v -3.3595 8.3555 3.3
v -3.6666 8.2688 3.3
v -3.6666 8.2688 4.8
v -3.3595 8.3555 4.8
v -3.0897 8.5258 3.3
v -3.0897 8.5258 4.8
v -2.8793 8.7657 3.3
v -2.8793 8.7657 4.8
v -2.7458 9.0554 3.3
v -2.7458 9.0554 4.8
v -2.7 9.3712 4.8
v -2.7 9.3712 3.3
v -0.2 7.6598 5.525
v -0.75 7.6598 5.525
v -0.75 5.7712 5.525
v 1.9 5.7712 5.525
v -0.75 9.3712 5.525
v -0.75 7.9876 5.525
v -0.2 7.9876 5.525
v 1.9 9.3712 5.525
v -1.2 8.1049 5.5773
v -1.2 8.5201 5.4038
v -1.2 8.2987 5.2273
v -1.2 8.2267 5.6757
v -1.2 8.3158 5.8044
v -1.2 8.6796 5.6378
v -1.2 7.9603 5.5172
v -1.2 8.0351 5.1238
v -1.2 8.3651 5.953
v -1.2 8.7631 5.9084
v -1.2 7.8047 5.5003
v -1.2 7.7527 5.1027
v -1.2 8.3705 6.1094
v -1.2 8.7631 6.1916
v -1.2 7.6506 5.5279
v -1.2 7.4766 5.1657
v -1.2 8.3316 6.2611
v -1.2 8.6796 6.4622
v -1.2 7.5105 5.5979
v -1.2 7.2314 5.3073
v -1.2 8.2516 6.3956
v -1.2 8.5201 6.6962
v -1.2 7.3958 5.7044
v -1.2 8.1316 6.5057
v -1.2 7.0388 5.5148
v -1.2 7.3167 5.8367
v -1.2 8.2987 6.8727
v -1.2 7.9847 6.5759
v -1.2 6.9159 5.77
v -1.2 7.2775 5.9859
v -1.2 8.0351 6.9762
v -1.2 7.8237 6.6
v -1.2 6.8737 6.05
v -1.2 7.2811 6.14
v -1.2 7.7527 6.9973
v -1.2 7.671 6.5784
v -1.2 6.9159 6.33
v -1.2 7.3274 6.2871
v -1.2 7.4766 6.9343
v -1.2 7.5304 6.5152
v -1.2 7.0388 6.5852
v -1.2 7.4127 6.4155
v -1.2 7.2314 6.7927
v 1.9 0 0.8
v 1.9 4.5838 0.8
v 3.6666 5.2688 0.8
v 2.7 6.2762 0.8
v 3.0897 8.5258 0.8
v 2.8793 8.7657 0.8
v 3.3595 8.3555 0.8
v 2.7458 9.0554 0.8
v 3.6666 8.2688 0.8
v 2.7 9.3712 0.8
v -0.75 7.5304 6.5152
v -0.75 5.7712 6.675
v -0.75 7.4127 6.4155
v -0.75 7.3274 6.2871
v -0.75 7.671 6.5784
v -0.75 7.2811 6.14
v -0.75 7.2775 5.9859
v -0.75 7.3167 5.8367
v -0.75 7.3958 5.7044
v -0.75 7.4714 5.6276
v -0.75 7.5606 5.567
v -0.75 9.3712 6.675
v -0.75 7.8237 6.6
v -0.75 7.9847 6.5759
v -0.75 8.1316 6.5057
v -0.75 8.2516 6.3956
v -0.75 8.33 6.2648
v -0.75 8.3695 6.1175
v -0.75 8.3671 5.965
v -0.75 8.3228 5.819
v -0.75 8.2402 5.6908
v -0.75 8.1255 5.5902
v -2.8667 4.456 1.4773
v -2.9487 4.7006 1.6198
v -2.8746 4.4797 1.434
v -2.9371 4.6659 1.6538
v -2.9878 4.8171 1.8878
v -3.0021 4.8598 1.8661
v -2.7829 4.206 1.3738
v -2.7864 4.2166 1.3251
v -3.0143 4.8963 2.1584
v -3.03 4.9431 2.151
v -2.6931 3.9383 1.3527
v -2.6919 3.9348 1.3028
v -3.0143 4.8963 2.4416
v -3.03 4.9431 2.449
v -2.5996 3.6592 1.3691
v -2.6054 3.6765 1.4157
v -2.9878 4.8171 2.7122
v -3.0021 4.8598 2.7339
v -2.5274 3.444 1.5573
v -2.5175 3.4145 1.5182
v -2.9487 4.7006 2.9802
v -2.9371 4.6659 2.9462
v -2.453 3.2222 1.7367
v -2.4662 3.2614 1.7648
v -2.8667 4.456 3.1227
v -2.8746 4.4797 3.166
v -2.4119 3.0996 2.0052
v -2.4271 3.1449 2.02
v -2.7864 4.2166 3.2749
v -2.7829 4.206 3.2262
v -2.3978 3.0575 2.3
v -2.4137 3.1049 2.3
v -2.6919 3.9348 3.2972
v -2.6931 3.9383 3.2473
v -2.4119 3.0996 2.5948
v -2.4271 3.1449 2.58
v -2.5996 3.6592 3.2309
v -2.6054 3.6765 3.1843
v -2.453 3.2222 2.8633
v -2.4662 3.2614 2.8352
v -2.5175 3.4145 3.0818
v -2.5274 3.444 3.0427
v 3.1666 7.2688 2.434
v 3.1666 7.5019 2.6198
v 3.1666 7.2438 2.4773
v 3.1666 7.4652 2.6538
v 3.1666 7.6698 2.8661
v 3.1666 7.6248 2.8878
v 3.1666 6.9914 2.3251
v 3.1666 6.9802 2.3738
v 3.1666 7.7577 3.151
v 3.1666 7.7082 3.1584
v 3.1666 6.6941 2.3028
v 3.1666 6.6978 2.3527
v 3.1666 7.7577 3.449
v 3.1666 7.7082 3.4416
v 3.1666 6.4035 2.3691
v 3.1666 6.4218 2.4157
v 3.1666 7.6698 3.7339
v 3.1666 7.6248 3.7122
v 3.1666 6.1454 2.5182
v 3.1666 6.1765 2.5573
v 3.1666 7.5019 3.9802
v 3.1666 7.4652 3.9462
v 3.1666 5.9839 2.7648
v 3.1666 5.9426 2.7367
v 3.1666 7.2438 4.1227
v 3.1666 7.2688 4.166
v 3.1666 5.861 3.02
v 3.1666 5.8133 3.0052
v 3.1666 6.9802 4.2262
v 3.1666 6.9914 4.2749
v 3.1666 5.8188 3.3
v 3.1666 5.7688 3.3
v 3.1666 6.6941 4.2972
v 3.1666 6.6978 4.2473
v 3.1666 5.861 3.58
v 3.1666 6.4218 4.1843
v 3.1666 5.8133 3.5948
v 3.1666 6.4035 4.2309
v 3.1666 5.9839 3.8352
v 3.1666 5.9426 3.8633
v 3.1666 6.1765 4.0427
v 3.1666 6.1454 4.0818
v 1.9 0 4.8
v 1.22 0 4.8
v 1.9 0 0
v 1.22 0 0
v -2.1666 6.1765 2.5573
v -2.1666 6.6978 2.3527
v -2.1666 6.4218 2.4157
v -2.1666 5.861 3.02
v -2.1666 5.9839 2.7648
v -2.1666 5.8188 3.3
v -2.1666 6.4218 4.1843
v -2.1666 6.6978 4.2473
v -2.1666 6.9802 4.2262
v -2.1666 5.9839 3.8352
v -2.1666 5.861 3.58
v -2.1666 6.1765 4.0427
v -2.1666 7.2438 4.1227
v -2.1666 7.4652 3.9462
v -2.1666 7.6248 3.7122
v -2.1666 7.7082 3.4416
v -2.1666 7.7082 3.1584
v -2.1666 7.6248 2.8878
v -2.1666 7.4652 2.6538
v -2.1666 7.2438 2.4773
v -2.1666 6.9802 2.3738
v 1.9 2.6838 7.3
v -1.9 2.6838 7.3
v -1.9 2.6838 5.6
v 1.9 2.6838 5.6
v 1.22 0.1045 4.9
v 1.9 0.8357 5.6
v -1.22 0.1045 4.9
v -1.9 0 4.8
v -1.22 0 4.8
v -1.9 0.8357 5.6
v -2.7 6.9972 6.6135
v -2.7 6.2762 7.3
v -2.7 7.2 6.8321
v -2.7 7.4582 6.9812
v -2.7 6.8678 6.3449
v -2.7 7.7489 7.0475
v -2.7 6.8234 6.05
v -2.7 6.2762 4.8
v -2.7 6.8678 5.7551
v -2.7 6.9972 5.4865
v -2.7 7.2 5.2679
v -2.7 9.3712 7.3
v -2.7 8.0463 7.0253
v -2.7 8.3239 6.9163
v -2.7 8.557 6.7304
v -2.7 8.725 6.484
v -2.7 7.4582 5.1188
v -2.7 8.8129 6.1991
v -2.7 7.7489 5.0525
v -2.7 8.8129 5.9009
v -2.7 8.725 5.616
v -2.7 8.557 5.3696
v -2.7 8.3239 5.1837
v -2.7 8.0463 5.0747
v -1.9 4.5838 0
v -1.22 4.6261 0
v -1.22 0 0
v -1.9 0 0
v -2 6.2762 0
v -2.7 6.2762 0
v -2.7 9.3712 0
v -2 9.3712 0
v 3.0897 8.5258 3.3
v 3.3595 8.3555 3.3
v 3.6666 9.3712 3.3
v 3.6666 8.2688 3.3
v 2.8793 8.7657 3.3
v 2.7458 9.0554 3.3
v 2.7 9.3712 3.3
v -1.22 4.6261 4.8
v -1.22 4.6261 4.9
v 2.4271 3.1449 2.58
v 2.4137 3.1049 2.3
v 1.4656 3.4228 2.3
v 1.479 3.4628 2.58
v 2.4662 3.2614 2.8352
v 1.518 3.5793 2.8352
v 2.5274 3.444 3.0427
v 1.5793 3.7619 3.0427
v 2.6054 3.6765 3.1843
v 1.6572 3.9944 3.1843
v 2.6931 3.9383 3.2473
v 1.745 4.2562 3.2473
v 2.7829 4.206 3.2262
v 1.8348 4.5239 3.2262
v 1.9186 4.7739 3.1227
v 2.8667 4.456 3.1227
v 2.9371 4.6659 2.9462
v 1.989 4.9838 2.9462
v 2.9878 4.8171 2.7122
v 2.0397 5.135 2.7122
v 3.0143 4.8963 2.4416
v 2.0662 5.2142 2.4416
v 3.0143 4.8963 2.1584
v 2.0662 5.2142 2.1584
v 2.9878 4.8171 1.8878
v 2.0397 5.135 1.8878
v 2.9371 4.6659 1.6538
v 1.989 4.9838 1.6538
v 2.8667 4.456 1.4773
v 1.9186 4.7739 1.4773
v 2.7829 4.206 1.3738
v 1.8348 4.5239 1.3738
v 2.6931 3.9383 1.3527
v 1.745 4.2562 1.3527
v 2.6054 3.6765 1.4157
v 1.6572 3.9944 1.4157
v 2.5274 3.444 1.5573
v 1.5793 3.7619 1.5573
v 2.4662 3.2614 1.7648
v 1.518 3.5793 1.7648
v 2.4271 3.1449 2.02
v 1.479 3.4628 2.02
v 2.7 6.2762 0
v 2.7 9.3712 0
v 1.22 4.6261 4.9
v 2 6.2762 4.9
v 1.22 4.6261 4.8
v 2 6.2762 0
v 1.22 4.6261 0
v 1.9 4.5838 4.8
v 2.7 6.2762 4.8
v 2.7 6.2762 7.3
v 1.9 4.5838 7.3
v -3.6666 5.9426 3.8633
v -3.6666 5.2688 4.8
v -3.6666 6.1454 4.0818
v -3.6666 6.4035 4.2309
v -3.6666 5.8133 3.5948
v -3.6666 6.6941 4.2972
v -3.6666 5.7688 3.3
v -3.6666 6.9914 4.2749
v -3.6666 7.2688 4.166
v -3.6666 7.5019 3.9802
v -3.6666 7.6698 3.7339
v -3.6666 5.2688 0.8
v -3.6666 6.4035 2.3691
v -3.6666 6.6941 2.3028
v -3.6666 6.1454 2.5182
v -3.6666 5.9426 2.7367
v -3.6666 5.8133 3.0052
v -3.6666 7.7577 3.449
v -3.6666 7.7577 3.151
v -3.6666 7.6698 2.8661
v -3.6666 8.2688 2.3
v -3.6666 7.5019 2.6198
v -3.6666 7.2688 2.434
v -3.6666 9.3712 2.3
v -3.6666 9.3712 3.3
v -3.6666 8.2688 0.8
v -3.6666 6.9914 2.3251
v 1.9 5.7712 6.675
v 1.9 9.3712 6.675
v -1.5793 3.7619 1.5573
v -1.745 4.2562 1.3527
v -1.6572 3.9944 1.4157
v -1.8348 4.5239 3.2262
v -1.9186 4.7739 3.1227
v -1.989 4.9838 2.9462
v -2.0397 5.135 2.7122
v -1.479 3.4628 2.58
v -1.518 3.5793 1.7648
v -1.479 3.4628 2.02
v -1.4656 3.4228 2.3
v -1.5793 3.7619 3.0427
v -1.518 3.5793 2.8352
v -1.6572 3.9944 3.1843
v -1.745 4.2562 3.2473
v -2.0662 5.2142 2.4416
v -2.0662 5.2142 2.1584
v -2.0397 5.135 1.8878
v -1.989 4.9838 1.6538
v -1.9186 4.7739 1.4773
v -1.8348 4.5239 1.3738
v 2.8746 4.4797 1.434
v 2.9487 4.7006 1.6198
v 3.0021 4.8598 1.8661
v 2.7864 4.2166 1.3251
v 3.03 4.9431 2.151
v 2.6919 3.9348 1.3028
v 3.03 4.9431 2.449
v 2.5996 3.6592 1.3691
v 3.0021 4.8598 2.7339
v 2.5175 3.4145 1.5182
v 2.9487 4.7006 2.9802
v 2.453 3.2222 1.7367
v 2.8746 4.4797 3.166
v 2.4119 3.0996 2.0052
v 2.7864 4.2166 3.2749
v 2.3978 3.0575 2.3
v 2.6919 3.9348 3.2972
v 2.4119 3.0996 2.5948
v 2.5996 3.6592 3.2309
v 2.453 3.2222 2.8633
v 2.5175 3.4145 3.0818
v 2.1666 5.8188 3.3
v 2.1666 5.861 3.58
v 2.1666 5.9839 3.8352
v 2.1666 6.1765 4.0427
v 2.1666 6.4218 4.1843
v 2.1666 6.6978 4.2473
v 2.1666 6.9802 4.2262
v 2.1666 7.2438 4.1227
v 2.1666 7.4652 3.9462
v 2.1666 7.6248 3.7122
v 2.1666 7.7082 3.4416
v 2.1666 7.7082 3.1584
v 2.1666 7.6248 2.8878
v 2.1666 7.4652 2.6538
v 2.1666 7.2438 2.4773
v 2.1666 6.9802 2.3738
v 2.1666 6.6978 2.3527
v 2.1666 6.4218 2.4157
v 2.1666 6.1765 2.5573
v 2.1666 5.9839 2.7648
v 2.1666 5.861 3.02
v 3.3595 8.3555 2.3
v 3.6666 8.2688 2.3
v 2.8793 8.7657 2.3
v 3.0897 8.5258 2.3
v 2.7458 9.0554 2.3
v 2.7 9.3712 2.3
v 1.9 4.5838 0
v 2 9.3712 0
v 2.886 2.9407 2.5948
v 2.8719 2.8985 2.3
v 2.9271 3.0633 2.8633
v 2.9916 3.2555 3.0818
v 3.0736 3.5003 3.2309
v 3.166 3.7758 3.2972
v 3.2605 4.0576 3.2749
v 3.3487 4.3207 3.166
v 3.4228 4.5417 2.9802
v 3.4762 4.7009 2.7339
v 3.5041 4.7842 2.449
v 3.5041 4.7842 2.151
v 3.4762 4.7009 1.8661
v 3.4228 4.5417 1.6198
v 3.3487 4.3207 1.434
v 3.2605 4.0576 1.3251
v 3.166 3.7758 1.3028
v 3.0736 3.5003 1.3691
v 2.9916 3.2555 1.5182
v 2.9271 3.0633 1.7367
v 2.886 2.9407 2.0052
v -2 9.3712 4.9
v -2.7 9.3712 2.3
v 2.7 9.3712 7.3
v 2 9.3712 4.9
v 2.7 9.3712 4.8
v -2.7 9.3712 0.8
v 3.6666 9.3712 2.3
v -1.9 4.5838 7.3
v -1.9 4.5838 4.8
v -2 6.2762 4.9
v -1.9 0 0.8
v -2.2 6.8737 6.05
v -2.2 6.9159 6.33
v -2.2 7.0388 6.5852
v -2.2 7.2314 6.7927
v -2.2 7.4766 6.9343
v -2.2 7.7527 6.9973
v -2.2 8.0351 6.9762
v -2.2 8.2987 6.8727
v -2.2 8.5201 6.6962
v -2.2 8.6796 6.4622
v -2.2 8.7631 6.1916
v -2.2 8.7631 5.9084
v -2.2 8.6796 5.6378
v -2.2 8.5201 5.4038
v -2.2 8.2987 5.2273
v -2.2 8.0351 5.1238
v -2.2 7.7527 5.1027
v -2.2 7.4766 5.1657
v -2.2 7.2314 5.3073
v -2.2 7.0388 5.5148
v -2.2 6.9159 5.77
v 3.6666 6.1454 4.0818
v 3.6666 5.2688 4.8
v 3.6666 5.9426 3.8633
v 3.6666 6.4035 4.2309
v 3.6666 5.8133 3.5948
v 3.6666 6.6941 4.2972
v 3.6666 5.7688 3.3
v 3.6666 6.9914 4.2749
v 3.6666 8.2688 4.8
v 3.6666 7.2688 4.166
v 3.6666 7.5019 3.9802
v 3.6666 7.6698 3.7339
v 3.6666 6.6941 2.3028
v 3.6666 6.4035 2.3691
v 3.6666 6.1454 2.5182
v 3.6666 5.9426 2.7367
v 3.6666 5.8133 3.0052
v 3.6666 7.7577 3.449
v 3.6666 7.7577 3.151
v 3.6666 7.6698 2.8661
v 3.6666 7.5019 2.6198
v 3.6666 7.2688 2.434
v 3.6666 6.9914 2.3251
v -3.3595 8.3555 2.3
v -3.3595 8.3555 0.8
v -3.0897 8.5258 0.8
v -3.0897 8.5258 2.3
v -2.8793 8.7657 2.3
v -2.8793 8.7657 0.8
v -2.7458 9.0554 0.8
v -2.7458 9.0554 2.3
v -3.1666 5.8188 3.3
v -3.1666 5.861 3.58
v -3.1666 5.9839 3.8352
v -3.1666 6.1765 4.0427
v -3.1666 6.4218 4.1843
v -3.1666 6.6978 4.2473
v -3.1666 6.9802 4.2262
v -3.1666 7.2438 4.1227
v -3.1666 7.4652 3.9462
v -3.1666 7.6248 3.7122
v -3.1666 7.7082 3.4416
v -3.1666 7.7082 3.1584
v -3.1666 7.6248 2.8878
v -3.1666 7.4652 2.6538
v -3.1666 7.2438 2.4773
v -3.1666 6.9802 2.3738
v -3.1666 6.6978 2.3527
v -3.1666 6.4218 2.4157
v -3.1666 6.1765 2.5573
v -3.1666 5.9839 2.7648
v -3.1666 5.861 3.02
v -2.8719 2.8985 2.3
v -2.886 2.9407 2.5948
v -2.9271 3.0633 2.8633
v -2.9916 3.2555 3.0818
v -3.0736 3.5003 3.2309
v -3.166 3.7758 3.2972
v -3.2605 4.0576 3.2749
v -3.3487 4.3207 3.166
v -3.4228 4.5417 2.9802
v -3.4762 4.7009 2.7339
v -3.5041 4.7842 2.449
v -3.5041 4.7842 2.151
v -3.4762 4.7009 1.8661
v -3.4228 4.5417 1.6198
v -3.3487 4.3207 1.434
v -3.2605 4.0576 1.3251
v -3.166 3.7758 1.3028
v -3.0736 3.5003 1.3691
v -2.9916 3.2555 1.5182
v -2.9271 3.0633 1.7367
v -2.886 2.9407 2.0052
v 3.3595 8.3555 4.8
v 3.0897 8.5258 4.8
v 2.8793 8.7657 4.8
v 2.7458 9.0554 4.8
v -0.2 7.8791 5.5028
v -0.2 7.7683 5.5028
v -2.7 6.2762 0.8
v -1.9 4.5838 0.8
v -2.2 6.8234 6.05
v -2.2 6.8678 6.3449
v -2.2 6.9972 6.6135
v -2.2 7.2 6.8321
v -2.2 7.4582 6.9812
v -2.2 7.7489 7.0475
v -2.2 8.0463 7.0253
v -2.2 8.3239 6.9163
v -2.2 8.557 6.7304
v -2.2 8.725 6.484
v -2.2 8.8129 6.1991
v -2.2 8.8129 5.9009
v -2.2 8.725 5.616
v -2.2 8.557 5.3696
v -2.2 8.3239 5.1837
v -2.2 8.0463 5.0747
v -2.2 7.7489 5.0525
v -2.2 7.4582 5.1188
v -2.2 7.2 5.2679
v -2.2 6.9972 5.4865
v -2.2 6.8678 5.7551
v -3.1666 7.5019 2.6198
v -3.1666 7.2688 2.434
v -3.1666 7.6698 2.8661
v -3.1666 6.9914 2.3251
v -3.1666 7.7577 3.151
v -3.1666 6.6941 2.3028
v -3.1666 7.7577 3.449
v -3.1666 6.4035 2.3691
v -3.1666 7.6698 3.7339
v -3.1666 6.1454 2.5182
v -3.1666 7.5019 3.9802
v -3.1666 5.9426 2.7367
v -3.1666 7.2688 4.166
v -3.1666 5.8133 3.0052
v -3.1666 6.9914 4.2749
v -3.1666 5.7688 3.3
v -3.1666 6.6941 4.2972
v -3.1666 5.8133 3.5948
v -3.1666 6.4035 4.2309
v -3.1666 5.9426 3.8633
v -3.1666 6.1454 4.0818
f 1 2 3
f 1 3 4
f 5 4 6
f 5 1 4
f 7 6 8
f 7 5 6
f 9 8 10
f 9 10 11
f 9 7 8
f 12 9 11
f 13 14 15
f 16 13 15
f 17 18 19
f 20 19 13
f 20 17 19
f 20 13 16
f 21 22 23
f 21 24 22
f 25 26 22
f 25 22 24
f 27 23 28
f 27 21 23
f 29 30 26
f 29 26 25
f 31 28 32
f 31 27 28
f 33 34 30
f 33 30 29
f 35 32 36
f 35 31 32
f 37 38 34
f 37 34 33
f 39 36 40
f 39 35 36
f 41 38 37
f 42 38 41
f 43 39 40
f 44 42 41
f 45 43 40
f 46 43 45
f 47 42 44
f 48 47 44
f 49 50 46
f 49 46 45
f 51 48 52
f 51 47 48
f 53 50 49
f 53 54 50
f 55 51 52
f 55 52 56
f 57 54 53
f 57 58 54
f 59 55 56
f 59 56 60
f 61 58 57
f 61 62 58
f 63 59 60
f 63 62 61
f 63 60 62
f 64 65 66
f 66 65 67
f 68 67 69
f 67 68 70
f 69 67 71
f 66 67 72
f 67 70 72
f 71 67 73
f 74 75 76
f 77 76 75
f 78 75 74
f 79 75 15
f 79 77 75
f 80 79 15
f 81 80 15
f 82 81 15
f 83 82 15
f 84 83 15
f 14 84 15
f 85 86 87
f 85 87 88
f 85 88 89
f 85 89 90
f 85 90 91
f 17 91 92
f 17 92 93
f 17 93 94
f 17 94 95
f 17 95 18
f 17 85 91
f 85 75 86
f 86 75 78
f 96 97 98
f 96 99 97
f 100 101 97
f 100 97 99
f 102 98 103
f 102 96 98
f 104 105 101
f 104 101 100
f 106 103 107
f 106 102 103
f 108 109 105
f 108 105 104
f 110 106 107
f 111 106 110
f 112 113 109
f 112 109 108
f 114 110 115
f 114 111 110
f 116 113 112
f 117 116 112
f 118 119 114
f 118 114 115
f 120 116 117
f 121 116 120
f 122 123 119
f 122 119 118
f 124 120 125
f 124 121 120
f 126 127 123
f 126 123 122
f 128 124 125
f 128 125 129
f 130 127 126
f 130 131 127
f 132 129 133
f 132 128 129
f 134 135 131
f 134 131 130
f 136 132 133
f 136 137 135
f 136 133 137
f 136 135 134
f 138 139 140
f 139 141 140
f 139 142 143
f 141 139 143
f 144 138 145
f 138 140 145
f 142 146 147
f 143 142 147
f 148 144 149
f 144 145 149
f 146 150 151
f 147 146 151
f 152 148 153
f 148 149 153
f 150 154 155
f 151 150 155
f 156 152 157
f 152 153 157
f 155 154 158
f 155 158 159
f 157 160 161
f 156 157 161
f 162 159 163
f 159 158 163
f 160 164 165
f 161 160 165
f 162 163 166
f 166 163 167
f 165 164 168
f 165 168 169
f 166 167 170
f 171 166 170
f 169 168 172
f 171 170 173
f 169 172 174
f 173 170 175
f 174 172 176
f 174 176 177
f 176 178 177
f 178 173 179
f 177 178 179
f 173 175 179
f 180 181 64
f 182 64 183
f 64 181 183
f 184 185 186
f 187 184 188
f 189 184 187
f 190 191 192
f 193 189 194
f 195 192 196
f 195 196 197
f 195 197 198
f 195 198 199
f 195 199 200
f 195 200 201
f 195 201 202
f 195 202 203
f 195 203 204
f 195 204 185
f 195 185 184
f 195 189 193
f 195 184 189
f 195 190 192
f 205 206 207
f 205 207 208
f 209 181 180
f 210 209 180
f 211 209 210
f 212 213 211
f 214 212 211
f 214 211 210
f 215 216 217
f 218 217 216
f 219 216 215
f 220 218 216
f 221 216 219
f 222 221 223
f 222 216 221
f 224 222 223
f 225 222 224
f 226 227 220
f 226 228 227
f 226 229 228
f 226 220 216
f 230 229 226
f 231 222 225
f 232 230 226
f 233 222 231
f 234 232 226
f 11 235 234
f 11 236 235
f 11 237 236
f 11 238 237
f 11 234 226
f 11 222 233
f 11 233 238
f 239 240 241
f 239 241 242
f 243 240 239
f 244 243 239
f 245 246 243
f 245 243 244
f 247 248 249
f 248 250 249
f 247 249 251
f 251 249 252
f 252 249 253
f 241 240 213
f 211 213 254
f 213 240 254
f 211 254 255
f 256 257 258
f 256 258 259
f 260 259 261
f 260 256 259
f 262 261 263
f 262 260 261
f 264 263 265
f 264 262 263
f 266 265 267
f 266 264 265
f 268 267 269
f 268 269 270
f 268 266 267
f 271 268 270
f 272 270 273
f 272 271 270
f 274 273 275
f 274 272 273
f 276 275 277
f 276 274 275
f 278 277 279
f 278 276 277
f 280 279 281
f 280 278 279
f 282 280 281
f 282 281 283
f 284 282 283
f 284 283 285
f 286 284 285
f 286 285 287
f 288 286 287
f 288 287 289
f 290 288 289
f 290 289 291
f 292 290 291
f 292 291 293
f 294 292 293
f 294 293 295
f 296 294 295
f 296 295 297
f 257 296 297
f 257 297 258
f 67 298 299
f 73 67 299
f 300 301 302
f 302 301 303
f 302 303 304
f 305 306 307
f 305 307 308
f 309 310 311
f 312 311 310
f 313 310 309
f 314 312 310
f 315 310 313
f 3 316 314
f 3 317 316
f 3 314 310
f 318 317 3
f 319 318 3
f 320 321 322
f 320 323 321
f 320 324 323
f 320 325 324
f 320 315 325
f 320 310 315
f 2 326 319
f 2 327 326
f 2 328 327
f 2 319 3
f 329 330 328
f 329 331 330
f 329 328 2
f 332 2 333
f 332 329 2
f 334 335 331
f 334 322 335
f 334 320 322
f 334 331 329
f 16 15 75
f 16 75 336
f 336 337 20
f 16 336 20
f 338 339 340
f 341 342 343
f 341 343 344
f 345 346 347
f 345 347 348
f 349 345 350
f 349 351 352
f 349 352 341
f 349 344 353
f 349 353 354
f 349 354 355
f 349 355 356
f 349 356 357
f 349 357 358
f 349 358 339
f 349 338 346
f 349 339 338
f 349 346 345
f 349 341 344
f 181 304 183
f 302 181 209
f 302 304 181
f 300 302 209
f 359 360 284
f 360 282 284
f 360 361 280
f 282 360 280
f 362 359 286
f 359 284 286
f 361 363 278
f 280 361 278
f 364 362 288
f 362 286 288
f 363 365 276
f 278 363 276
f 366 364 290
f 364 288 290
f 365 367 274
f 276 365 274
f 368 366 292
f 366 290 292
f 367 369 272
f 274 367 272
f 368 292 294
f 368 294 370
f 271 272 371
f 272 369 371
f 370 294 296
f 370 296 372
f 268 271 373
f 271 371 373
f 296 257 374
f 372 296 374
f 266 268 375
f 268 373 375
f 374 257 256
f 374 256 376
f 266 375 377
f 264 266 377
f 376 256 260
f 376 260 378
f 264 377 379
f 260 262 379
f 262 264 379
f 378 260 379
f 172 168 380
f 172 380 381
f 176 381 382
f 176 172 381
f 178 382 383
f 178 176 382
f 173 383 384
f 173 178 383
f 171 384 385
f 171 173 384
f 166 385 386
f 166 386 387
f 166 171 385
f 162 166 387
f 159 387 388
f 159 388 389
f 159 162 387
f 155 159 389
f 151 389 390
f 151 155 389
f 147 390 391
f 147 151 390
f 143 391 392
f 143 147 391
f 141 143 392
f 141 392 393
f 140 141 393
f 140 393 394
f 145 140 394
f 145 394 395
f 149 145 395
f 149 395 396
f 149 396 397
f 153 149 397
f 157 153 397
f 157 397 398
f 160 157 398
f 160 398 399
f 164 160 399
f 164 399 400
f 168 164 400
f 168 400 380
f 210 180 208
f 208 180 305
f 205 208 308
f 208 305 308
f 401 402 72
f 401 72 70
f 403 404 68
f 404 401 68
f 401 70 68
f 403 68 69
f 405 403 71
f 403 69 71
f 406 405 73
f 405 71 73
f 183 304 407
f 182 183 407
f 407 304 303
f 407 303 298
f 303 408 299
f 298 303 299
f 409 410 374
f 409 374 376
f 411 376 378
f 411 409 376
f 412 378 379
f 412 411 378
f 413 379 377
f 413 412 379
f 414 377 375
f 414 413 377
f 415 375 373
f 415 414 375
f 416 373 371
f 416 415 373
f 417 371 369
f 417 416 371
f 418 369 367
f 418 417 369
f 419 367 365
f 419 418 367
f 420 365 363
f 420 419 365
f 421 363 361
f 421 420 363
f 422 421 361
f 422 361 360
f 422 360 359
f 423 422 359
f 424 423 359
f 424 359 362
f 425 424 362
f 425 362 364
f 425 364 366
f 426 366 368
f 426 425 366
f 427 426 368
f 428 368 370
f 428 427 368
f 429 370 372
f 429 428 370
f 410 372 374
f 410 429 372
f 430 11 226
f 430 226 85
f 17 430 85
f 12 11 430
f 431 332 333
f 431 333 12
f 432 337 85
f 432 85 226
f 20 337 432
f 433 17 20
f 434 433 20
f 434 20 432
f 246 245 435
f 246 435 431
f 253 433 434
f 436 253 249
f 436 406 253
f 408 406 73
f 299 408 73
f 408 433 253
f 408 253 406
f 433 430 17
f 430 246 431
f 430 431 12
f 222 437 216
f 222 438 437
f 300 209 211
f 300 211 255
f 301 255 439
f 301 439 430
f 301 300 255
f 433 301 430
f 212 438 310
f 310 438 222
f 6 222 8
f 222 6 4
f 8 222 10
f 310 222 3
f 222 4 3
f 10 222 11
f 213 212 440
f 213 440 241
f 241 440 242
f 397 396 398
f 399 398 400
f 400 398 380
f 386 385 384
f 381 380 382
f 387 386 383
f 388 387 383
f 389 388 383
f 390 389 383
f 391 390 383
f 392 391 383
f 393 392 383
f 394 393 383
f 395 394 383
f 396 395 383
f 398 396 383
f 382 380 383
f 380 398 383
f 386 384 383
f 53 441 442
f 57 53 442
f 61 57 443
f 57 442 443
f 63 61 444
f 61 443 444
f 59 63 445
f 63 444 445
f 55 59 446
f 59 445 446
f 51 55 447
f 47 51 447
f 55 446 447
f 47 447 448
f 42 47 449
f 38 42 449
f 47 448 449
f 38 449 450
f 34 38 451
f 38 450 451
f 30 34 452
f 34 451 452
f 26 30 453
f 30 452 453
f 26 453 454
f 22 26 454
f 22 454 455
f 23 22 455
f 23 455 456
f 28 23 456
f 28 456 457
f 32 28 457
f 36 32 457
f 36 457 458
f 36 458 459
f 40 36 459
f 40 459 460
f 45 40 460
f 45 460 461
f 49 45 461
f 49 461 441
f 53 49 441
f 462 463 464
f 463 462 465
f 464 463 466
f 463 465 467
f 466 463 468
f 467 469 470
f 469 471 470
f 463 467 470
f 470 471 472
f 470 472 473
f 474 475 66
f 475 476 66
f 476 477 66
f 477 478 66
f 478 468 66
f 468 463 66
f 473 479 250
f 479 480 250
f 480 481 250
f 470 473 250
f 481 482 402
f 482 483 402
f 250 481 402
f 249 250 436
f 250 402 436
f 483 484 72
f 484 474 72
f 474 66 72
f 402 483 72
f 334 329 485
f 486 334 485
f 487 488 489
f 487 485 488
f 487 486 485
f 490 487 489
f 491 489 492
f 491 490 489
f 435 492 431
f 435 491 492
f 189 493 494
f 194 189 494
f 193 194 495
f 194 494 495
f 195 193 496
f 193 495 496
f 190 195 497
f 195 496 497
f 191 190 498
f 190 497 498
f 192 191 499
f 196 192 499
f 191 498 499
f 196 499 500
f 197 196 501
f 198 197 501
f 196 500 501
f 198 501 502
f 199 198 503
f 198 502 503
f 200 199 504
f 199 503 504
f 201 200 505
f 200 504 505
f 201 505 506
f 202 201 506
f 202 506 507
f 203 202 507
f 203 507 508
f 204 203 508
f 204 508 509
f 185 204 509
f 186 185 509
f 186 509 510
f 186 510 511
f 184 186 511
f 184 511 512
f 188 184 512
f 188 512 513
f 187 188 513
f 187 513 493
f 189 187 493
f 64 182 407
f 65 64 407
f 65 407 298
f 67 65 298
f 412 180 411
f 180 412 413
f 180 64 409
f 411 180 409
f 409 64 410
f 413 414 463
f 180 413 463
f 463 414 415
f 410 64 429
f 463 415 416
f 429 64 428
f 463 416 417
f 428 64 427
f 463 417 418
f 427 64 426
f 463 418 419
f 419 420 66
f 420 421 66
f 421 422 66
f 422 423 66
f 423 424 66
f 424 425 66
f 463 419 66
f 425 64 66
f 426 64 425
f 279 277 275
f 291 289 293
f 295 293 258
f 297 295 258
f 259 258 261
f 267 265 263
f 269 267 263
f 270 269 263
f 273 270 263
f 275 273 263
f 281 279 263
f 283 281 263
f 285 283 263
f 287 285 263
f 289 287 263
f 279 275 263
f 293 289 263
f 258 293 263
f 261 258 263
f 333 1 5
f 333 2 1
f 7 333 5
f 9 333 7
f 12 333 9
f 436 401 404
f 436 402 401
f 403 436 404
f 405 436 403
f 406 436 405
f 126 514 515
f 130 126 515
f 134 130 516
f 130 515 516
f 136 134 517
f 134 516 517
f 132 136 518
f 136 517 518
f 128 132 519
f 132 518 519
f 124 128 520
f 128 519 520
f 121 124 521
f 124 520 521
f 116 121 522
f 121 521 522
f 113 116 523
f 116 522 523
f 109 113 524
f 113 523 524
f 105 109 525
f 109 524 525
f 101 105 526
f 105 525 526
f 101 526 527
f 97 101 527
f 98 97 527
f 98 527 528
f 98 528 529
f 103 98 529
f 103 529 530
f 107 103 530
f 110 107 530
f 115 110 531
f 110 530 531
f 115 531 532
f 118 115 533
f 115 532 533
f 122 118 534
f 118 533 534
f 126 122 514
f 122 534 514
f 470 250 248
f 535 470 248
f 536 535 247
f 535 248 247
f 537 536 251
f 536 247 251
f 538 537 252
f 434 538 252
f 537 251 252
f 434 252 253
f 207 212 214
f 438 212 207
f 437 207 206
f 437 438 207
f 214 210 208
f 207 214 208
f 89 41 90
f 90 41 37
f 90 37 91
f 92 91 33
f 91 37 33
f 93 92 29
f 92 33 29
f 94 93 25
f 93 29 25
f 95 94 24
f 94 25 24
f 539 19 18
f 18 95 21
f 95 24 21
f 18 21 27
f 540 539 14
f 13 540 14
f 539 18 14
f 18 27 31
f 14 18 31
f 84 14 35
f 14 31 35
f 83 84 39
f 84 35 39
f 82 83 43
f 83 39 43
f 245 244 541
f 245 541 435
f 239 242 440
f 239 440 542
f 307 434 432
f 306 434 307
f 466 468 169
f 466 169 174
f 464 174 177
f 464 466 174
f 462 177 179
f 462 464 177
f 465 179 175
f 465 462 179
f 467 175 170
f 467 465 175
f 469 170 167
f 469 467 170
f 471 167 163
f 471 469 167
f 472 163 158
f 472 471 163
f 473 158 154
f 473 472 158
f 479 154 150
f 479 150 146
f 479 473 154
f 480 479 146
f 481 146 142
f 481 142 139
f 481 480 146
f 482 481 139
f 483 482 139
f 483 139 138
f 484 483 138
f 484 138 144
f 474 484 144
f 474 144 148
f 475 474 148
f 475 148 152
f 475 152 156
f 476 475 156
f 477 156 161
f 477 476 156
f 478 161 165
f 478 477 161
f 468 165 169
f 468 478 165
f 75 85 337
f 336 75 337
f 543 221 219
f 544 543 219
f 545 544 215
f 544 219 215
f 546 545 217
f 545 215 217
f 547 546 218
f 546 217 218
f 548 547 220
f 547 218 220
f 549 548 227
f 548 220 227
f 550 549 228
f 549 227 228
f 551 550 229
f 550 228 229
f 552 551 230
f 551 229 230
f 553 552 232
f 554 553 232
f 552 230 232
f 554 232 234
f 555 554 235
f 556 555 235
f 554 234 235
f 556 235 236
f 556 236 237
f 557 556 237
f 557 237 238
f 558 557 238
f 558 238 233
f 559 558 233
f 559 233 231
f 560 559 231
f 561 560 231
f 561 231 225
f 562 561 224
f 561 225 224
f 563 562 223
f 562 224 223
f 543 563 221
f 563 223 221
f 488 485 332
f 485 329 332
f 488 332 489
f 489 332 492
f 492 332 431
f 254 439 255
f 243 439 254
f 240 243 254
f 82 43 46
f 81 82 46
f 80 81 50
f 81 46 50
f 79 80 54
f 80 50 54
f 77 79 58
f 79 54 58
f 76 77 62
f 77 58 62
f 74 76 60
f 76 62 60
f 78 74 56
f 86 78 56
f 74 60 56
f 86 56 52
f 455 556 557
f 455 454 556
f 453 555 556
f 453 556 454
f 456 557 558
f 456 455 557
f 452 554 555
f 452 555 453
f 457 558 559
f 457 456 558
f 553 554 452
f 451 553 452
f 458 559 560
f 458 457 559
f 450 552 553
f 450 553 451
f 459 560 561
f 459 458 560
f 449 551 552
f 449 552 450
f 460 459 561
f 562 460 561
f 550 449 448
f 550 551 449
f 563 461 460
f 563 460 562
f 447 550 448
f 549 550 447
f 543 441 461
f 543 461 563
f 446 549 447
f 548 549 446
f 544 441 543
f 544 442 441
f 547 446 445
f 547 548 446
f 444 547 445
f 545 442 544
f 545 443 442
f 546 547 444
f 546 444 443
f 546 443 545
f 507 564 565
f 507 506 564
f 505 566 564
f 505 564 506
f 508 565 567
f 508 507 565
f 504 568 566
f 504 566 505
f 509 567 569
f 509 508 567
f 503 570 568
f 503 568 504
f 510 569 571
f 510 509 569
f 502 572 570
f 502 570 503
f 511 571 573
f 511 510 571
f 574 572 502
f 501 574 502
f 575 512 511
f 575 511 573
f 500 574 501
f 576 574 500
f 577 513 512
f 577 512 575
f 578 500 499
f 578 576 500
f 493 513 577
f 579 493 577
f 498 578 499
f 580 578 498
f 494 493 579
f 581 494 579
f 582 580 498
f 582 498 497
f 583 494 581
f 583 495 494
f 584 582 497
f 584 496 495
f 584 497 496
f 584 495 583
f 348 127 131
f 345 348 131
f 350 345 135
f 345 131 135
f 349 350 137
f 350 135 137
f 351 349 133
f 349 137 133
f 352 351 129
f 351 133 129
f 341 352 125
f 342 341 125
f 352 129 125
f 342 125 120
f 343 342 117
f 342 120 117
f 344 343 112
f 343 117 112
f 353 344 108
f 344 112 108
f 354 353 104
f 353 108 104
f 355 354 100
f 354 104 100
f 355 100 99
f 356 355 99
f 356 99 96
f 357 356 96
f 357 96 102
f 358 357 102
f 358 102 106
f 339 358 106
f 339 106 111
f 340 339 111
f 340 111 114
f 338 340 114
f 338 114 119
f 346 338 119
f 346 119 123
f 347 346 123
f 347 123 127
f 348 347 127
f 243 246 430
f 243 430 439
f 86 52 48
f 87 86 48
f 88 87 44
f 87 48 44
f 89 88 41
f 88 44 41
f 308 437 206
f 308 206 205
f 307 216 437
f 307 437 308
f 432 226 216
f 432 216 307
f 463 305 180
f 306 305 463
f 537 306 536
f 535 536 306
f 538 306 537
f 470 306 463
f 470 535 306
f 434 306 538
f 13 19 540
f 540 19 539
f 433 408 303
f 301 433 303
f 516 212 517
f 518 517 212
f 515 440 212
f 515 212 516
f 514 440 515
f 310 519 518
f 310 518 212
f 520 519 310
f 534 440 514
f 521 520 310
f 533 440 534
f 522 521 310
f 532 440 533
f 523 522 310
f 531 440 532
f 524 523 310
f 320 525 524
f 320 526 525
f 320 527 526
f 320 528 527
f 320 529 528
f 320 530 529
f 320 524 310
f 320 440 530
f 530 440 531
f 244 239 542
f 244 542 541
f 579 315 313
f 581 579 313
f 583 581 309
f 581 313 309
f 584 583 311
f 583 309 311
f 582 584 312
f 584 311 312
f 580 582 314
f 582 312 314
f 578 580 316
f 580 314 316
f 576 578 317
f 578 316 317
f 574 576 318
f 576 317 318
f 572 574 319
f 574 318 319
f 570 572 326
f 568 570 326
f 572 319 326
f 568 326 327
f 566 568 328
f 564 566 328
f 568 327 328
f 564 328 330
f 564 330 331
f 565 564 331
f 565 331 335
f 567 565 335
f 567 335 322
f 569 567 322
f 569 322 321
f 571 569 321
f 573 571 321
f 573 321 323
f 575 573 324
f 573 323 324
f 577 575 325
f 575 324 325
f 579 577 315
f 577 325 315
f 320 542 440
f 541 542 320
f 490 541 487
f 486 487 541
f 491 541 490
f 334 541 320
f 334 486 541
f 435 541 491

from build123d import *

# Parameters (mm, degrees)
BOSS_EXTRUDE1_DEPTH             = 5.6
BOSS_EXTRUDE2_DEPTH             = 2
BOSS_EXTRUDE2_DEPTH_BACK        = 2
SKETCH4_R                       = 0.95
CUT_EXTRUDE1_DEPTH              = 1.5
SKETCH4_4_R                     = 1
CUT_EXTRUDE2_DEPTH              = 0.5
SKETCH5_R                       = 0.95
CUT_EXTRUDE3_DEPTH              = 1.5
SKETCH5_3_R                     = 1
CUT_EXTRUDE4_DEPTH              = 0.5
BOSS_EXTRUDE3_REACH             = 22.624
SKETCH6_W                       = 0.966611368
SKETCH6_H                       = 1
BOSS_EXTRUDE4_START             = -1.2
SKETCH8_W                       = 0.7
SKETCH8_H                       = 4.583786921
BOSS_EXTRUDE4_DEPTH             = 2.4
BOSS_EXTRUDE5_REACH             = 22.624
SKETCH10_W                      = 0.7
SKETCH10_H                      = 14.923504875
BOSS_EXTRUDE5_DIRECTION_2_REACH = 22.624
SKETCH13_W                      = 7.333222736
SKETCH13_H                      = 6.9
CUT_EXTRUDE8_DEPTH              = 21.62373565
BOSS_EXTRUDE6_REACH             = 16.274
BOSS_EXTRUDE6_DIRECTION_2_REACH = 16.274
CUT_EXTRUDE9_START              = -4.626097
SKETCH14_W                      = 2.44
SKETCH14_H                      = 4.8
CUT_EXTRUDE9_DEPTH              = 4.626097
BOSS_EXTRUDE7_DEPTH             = 1.7
CUT_EXTRUDE10_DEPTH             = 16.595543228
SKETCH18_W                      = 2.44
SKETCH18_H                      = 0.1
CUT_EXTRUDE11_DEPTH             = 16.022577853
CUT_EXTRUDE12_DEPTH             = 16.022577853
CUT_EXTRUDE12_DEPTH_BACK        = 16.022577853
SKETCH20_W                      = 7.333222736
SKETCH20_H                      = 3.236091791
CUT_EXTRUDE13_DEPTH             = 2.5
SKETCH21_3_R                    = 0.95
CUT_EXTRUDE14_DEPTH             = 1.5
SKETCH21_4_R                    = 1.000336047
CUT_EXTRUDE15_DEPTH             = 0.5
SKETCH22_W                      = 2.65
SKETCH22_H                      = 1.15
CUT_EXTRUDE16_DEPTH             = 3.6
SKETCH28_W                      = 3.8
SKETCH28_H                      = 1.7
BOSS_EXTRUDE10_DEPTH            = 0.15


with BuildPart() as part:
    # Sketch1 → Boss-Extrude1 (new body)
    with BuildSketch(Plane.XY):
        Polygon((-1.2, 0), (-1.9, 0), (-1.9, 4.583786921), (-2.7, 6.276200005), (-2.7, 19.507291796), (-2, 19.507291796), (-2, 6.276200005), (-1.2, 4.583786921), align=None)
    extrude(amount=BOSS_EXTRUDE1_DEPTH)

    # Sketch3 → Boss-Extrude2 (add, two sides: drawn at the far end of the back side and taken through both)
    with BuildSketch(Plane.XY.offset(2.8).offset(-BOSS_EXTRUDE2_DEPTH_BACK)):
        with BuildLine():
            Line((-1.9, 0), (-3.666611368, 5.268840762))
            Line((-3.666611368, 5.268840762), (-3.666611368, 8.268840762))
            ThreePointArc((-3.666611368, 8.268840762), (-2.975877619, 8.638135643), (-2.7, 9.371200005))
            Line((-2.7, 9.371200005), (-2.7, 6.276200005))
            Line((-2.7, 6.276200005), (-1.9, 4.583786921))
            Line((-1.9, 4.583786921), (-1.9, 0))
        make_face()
    extrude(amount=BOSS_EXTRUDE2_DEPTH + BOSS_EXTRUDE2_DEPTH_BACK)

    # Sketch4 → Cut-Extrude1 (cut)
    with BuildSketch(Plane.ZY.offset(3.666611368)):
        with Locations(Location((3.3, 6.768840762, 0), (0, 0, 270))):
            Circle(SKETCH4_R)
    extrude(amount=-CUT_EXTRUDE1_DEPTH, mode=Mode.SUBTRACT)

    # Sketch4<4> → Cut-Extrude2 (cut)
    with BuildSketch(Plane.ZY.offset(3.666611368)):
        with Locations(Location((3.3, 6.768840762, 0), (0, 0, 270))):
            Circle(SKETCH4_4_R)
    extrude(amount=-CUT_EXTRUDE2_DEPTH, mode=Mode.SUBTRACT)

    # Sketch5 → Cut-Extrude3 (cut)
    with BuildSketch(Plane(origin=(-1.707984686, -0.572677236, 0), x_dir=(0, 0, 1), z_dir=(-0.9481240996322365, -0.3179004430581389, 0))):
        with Locations(Location((2.3, 4.661132282, 0), (0, 0, 270))):
            Circle(SKETCH5_R)
    extrude(amount=-CUT_EXTRUDE3_DEPTH, mode=Mode.SUBTRACT)

    # Sketch5<3> → Cut-Extrude4 (cut)
    with BuildSketch(Plane(origin=(-1.707984686, -0.572677236, 0), x_dir=(0, 0, 1), z_dir=(-0.9481240996322365, -0.3179004430581389, 0))):
        with Locations(Location((2.3, 4.661132282, 0), (0, 0, 270))):
            Circle(SKETCH5_3_R)
    extrude(amount=-CUT_EXTRUDE4_DEPTH, mode=Mode.SUBTRACT)

    # Sketch6 → Boss-Extrude3 (add, up to next)
    with BuildSketch(Plane(origin=(0, 19.507291796, 0), x_dir=(1, 0, 0), z_dir=(0, 1, 0)), mode=Mode.PRIVATE) as boss_extrude3_sk1:
        with Locations((-3.183305684, -2.8)):
            Rectangle(SKETCH6_W, SKETCH6_H)
    boss_extrude3_tool1 = extrude(boss_extrude3_sk1.sketch, amount=-BOSS_EXTRUDE3_REACH, mode=Mode.PRIVATE) - part.part
    add(boss_extrude3_tool1.solids().sort_by_distance((-3.183306, 19.507292, 2.8))[0])


with BuildPart() as body_2:
    # Mirror7: mirrored copy
    add(part.part.mirror(Plane(origin=(0, 0, 0), x_dir=(0, 0, 1), z_dir=(1, 0, 0))))


with BuildPart() as part_1:
    add(part.part)

    add(body_2.part)  # Boss-Extrude4 merges body 2
    # Sketch8 → Boss-Extrude4 (add)
    with BuildSketch(Plane(origin=(0, 0, 0), x_dir=(0, 0, -1), z_dir=(1, 0, 0)).offset(BOSS_EXTRUDE4_START)):
        with Locations((-5.25, 2.291893461)):
            Rectangle(SKETCH8_W, SKETCH8_H)
    extrude(amount=BOSS_EXTRUDE4_DEPTH)

    # Sketch10 → Boss-Extrude5 (add, up to next)
    with BuildSketch(Plane(origin=(0, 0, 0), x_dir=(0, 0, -1), z_dir=(1, 0, 0)), mode=Mode.PRIVATE) as boss_extrude5_sk1:
        with Locations((-5.25, 12.045539359)):
            Rectangle(SKETCH10_W, SKETCH10_H)
    boss_extrude5_tool1 = extrude(boss_extrude5_sk1.sketch, amount=BOSS_EXTRUDE5_REACH, mode=Mode.PRIVATE) - part_1.part
    add(boss_extrude5_tool1.solids().sort_by_distance((0, 12.045539, 5.25))[0])

    # Sketch10 → Boss-Extrude5 direction 2 (add, up to next)
    with BuildSketch(Plane(origin=(0, 0, 0), x_dir=(0, 0, -1), z_dir=(1, 0, 0)), mode=Mode.PRIVATE) as boss_extrude5_direction_2_sk1:
        with Locations((-5.25, 12.045539359)):
            Rectangle(SKETCH10_W, SKETCH10_H)
    boss_extrude5_direction_2_tool1 = extrude(boss_extrude5_direction_2_sk1.sketch, amount=-BOSS_EXTRUDE5_DIRECTION_2_REACH, mode=Mode.PRIVATE) - part_1.part
    add(boss_extrude5_direction_2_tool1.solids().sort_by_distance((0, 12.045539, 5.25))[0])

    # Sketch13 → Cut-Extrude8 (cut, through all)
    with BuildSketch(Plane.XY.offset(5.6)):
        with Locations((0, 16.057291796)):
            Rectangle(SKETCH13_W, SKETCH13_H)
    extrude(amount=-CUT_EXTRUDE8_DEPTH, mode=Mode.SUBTRACT)

    # Boss-Extrude6: up to this face of the body (flat: up to its plane)
    boss_extrude6_end = Plane(part_1.part.faces().sort_by_distance((1.9, 2.291893461, 5.2))[0])
    # Sketch9 → Boss-Extrude6 (add, up to the picked face)
    with BuildSketch(Plane(origin=(0, 0, 0), x_dir=(0, 0, -1), z_dir=(1, 0, 0)), mode=Mode.PRIVATE) as boss_extrude6_sk1:
        Polygon((-5.58241188, 1.018611498), (-4.8, 0.201293385), (-4.8, -0.528706615), (-5.58241188, 0.288611498), align=None)
    boss_extrude6_tool1 = split(extrude(boss_extrude6_sk1.sketch, amount=BOSS_EXTRUDE6_REACH, mode=Mode.PRIVATE), bisect_by=boss_extrude6_end, keep=Keep.BOTH, mode=Mode.PRIVATE)
    add(boss_extrude6_tool1.solids().sort_by(Axis((0, 0.244952, 5.191206), (1, 0, 0)))[0])

    # Boss-Extrude6 direction 2: up to this face of the body (flat: up to its plane)
    boss_extrude6_direction_2_end = Plane(part_1.part.faces().sort_by_distance((-1.9, 2.291893461, 5.2))[0])
    # Sketch9 → Boss-Extrude6 direction 2 (add, up to the picked face)
    with BuildSketch(Plane(origin=(0, 0, 0), x_dir=(0, 0, -1), z_dir=(1, 0, 0)), mode=Mode.PRIVATE) as boss_extrude6_direction_2_sk1:
        Polygon((-5.58241188, 1.018611498), (-4.8, 0.201293385), (-4.8, -0.528706615), (-5.58241188, 0.288611498), align=None)
    boss_extrude6_direction_2_tool1 = split(extrude(boss_extrude6_direction_2_sk1.sketch, amount=-BOSS_EXTRUDE6_DIRECTION_2_REACH, mode=Mode.PRIVATE), bisect_by=boss_extrude6_direction_2_end, keep=Keep.BOTH, mode=Mode.PRIVATE)
    add(boss_extrude6_direction_2_tool1.solids().sort_by(Axis((0, 0.244952, 5.191206), (-1, 0, 0)))[0])

    # Sketch14 → Cut-Extrude9 (cut)
    with BuildSketch(Plane.XZ.offset(CUT_EXTRUDE9_START)):
        with Locations((0, 2.4)):
            Rectangle(SKETCH14_W, SKETCH14_H)
    extrude(amount=CUT_EXTRUDE9_DEPTH, mode=Mode.SUBTRACT)

    # Sketch16 → Boss-Extrude7 (add)
    with BuildSketch(Plane.XY.offset(5.6)):
        Polygon((-2.7, 12.607291796), (2.7, 12.607291796), (2.7, 6.276200005), (1.9, 4.583786921), (1.9, 2.833786921), (-1.9, 2.833786921), (-1.9, 4.583786921), (-2.7, 6.276200005), align=None)
    extrude(amount=BOSS_EXTRUDE7_DEPTH)

    # Sketch17 → Cut-Extrude10 (cut, through all)
    with BuildSketch(Plane.ZY.offset(1.9)):
        Polygon((4.8, -0.528706615), (4.8, 0), (5.6, 0.835690902), (5.6, 0), (5.306126476, 0), align=None)
    extrude(amount=-CUT_EXTRUDE10_DEPTH, mode=Mode.SUBTRACT)

    # Sketch18 → Cut-Extrude11 (cut, through all)
    with BuildSketch(Plane(origin=(0, 12.607291796, 0), x_dir=(1, 0, 0), z_dir=(0, 1, 0))):
        with Locations((0, -4.85)):
            Rectangle(SKETCH18_W, SKETCH18_H)
    extrude(amount=-CUT_EXTRUDE11_DEPTH, mode=Mode.SUBTRACT)

    # Sketch20 → Cut-Extrude12 (cut, two sides: drawn at the far end of the back side and taken through both)
    with BuildSketch(Plane.XY.offset(7.3).offset(-CUT_EXTRUDE12_DEPTH_BACK)):
        with Locations((0, 10.989245901)):
            Rectangle(SKETCH20_W, SKETCH20_H)
    extrude(amount=CUT_EXTRUDE12_DEPTH + CUT_EXTRUDE12_DEPTH_BACK, mode=Mode.SUBTRACT)

    # Sketch21 → Cut-Extrude13 (cut)
    with BuildSketch(Plane.ZY.offset(2.7)):
        with BuildLine():
            ThreePointArc((6.395601498, 8.251554659), (5.622145346, 8.169301503), (5.704398502, 7.395845352))
            Line((5.704398502, 7.395845352), (6.395601498, 8.251554659))
        make_face()
        with BuildLine():
            Line((6.395601498, 8.251554659), (5.704398502, 7.395845352))
            ThreePointArc((5.704398502, 7.395845352), (6.287085614, 7.327423458), (6.6, 7.823700005))
            ThreePointArc((6.6, 7.823700005), (6.546276548, 8.060785619), (6.395601498, 8.251554659))
        make_face()
    extrude(amount=-CUT_EXTRUDE13_DEPTH, mode=Mode.SUBTRACT)

    # Sketch21<3> → Cut-Extrude14 (cut)
    with BuildSketch(Plane.ZY.offset(2.7)):
        with Locations(Location((6.05, 7.823700005, 0), (0, 0, 270))):
            Circle(SKETCH21_3_R)
    extrude(amount=-CUT_EXTRUDE14_DEPTH, mode=Mode.SUBTRACT)

    # Sketch21<4> → Cut-Extrude15 (cut)
    with BuildSketch(Plane.ZY.offset(2.7)):
        with Locations(Location((6.05, 7.823700005, 0), (0, 0, 270))):
            Circle(SKETCH21_4_R)
    extrude(amount=-CUT_EXTRUDE15_DEPTH, mode=Mode.SUBTRACT)

    # Sketch22 → Cut-Extrude16 (cut)
    with BuildSketch(Plane(origin=(0, 9.371200005, 0), x_dir=(1, 0, 0), z_dir=(0, 1, 0))):
        with Locations((0.575, -6.1)):
            Rectangle(SKETCH22_W, SKETCH22_H)
    extrude(amount=-CUT_EXTRUDE16_DEPTH, mode=Mode.SUBTRACT)

    # Sketch28 → Boss-Extrude10 (add)
    with BuildSketch(Plane.XZ.offset(-2.833786921)):
        with Locations((0, 6.45)):
            Rectangle(SKETCH28_W, SKETCH28_H)
    extrude(amount=BOSS_EXTRUDE10_DEPTH)


solid = part_1.part
